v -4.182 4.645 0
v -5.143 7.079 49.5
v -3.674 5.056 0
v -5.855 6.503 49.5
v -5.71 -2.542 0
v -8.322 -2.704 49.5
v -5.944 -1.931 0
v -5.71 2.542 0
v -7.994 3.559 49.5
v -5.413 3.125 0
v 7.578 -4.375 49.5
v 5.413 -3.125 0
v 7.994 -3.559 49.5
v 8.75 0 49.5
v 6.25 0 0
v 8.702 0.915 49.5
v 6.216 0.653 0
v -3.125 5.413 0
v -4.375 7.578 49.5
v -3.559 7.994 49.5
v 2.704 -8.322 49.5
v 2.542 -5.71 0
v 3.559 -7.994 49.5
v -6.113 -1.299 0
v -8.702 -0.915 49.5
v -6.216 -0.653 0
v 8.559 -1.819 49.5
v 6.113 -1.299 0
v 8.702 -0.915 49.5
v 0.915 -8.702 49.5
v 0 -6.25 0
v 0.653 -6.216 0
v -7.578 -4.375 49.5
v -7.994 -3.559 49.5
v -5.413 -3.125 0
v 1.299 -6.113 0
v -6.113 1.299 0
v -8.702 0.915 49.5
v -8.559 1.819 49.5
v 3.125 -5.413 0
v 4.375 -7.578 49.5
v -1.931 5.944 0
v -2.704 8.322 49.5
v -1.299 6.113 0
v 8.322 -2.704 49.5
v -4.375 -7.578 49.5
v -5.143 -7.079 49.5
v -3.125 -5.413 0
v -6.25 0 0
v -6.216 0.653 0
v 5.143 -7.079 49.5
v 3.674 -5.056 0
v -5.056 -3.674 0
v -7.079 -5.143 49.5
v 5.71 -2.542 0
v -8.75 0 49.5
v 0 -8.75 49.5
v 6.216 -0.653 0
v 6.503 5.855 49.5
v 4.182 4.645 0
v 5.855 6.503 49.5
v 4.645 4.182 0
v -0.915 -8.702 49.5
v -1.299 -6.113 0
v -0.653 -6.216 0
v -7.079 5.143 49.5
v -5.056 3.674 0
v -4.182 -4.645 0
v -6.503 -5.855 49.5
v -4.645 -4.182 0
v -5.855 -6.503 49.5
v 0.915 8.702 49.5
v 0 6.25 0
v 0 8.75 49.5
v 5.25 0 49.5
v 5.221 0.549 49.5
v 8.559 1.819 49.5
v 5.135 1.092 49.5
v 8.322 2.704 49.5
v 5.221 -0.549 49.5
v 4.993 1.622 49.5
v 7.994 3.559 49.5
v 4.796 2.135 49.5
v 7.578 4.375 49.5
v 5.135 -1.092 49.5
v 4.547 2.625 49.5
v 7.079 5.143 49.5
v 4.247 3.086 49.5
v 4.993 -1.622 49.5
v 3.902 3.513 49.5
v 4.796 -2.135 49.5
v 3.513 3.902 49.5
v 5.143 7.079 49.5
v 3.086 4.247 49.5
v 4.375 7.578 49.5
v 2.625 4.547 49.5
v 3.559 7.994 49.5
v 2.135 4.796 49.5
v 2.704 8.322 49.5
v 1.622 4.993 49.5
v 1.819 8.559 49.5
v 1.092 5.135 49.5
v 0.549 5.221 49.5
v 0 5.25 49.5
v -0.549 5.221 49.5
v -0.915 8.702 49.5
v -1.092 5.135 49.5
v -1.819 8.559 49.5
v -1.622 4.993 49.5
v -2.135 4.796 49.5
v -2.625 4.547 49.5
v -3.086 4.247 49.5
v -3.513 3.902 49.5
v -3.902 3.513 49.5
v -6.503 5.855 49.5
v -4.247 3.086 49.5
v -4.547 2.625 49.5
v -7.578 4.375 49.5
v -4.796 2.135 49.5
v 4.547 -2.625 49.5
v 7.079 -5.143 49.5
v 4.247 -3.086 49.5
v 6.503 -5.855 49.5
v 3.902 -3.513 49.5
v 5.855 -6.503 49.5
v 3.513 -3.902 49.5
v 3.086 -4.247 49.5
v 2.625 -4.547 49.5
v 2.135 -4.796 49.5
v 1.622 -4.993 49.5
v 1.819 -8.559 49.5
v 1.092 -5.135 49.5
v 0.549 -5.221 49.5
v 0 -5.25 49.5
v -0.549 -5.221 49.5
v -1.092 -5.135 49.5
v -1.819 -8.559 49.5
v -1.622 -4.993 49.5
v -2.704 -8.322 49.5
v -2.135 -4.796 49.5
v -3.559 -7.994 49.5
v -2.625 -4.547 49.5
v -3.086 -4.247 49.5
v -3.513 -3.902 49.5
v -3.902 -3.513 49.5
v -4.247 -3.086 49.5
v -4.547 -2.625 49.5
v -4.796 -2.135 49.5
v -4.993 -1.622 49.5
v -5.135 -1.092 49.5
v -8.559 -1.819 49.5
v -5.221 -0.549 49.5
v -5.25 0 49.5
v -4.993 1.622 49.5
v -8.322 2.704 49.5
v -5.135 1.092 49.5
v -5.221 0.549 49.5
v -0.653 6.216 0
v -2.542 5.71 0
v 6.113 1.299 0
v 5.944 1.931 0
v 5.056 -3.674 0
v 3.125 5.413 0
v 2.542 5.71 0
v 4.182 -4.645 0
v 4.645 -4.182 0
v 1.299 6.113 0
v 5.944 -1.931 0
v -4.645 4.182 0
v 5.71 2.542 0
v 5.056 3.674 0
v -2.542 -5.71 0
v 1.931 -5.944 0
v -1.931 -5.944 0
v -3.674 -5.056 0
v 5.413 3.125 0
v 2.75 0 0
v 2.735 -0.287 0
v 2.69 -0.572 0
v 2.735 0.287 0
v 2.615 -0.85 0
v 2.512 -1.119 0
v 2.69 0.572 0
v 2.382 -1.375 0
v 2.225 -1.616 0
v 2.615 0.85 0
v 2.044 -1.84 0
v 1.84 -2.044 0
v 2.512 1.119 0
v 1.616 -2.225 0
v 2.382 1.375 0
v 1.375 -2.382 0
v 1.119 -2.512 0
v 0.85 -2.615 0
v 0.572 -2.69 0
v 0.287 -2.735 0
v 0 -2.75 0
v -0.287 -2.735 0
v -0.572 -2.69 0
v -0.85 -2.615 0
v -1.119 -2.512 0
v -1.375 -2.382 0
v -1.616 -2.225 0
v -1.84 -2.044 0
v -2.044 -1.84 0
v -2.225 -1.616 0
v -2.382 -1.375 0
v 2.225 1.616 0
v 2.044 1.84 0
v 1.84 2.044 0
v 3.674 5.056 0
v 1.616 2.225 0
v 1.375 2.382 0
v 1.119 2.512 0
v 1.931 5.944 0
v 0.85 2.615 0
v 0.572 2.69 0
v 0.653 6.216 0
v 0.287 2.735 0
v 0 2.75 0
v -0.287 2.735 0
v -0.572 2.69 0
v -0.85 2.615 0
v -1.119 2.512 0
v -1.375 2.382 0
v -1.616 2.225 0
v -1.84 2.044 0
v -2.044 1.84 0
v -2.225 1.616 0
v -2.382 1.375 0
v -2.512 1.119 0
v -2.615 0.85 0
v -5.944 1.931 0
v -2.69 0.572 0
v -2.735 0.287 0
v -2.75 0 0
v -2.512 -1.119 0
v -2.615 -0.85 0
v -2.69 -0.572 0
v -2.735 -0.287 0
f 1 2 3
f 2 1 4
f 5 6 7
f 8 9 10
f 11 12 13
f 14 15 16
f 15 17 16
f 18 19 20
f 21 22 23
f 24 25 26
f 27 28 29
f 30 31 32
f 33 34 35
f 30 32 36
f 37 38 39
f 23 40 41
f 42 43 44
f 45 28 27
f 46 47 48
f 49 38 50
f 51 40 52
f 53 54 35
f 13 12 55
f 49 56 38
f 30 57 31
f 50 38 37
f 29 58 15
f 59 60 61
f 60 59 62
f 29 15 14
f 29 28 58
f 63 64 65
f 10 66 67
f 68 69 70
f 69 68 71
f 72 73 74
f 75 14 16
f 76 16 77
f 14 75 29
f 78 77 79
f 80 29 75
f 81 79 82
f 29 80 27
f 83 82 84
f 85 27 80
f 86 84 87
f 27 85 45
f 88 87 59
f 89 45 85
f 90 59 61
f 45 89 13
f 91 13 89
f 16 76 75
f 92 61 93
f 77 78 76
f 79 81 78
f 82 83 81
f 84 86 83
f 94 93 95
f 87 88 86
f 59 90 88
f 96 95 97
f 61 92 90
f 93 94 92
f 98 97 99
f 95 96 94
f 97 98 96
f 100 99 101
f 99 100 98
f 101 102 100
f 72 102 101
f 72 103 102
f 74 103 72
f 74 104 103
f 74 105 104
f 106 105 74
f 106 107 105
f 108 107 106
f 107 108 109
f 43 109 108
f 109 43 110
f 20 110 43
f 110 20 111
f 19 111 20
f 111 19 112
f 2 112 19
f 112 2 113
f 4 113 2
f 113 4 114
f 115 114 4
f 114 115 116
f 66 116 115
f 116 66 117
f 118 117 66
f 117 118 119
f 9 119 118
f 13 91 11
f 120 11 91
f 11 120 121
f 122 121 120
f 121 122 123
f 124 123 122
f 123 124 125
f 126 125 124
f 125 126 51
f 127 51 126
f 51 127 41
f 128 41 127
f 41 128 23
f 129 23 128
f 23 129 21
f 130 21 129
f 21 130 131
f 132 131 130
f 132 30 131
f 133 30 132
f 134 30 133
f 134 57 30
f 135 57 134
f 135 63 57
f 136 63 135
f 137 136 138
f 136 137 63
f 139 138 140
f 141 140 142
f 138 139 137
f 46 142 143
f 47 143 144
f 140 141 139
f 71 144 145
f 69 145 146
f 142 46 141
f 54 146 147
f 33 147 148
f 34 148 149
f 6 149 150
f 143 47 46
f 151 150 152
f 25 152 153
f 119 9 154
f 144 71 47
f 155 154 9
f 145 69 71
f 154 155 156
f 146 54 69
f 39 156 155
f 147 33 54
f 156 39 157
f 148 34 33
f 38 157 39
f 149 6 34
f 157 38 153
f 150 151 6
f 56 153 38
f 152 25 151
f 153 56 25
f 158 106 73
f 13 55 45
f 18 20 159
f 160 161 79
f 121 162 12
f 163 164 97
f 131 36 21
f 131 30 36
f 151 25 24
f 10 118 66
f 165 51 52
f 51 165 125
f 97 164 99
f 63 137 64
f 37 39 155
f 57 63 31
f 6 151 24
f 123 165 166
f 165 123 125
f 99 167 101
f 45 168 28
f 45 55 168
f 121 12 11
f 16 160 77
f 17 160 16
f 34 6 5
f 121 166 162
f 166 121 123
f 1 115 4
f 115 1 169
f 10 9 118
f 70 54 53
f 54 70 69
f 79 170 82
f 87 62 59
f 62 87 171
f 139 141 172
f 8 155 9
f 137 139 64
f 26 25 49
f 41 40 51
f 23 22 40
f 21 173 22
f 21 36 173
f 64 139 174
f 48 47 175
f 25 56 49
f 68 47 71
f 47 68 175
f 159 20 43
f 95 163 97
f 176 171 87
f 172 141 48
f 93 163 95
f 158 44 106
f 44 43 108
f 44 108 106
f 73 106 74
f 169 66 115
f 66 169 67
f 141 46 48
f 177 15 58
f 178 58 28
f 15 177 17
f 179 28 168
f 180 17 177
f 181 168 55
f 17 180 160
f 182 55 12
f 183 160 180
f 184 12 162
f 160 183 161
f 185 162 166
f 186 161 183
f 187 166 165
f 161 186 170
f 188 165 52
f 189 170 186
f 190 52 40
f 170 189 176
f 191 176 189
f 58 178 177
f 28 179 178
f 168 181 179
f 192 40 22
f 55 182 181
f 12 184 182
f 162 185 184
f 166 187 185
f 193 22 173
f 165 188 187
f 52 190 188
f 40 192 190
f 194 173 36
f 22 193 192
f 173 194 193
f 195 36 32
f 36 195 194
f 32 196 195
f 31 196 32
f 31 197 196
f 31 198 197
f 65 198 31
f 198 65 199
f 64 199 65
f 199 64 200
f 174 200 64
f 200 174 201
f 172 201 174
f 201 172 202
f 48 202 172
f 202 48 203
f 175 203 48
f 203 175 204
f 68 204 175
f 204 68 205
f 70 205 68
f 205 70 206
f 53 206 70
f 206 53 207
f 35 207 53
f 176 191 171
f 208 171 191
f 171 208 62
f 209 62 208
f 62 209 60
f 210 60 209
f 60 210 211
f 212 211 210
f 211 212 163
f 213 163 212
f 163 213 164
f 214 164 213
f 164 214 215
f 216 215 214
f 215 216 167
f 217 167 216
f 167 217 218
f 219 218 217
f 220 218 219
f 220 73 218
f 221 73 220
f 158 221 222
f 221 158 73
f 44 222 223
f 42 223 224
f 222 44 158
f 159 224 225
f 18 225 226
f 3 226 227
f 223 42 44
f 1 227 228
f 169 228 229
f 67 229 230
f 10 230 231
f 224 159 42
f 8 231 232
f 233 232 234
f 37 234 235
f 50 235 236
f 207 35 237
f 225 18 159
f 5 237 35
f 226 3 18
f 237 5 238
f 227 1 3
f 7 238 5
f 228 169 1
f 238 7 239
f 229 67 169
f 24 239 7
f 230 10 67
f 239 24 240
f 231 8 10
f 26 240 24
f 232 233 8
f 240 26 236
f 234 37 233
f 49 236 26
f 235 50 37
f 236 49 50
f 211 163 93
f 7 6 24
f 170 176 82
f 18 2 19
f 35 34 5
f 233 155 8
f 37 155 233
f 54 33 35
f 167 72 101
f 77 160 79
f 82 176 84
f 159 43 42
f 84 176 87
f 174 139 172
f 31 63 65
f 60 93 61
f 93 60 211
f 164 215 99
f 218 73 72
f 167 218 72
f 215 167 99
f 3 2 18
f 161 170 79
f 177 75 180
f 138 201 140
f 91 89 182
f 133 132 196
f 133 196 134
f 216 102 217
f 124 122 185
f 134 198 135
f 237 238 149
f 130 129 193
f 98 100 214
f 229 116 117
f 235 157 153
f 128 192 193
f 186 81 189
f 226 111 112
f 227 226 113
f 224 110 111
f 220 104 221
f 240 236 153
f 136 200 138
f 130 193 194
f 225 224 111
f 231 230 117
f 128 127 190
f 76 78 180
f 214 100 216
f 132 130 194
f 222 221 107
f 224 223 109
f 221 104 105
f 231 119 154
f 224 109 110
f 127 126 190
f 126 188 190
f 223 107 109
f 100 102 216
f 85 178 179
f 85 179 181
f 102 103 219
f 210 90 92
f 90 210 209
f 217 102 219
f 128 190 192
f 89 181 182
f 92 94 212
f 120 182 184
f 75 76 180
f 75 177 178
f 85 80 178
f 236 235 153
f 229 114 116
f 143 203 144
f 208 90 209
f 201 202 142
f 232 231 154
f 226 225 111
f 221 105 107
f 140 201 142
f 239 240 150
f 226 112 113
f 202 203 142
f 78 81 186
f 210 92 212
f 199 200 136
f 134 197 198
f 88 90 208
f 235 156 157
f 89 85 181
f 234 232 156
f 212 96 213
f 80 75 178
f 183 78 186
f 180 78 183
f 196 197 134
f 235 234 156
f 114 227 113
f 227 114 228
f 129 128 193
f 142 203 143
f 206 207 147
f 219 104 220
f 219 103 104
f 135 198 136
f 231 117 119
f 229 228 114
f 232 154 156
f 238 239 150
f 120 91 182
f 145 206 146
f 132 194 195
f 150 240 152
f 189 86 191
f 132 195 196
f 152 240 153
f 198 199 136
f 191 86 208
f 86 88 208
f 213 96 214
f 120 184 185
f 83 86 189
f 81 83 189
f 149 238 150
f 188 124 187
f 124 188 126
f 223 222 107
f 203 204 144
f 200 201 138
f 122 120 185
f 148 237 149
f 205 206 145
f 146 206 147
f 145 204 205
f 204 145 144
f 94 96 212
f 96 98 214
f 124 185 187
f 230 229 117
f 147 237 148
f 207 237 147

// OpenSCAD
//Outer Handle
ohD1=12.5;
ohD2=17.5;
ohH=49.5;

//Shell
shell=3.5; //wall thickness
ihD1=ohD1-(2*shell);
ihD2=ohD2-(2*shell);
ihH=ohH;

res=60;

difference(){
    cylinder(h=ohH, d1=ohD1, d2=ohD2, $fn=res);
    cylinder(h=ihH, d1=ihD1, d2=ihD2, $fn=res);
}
